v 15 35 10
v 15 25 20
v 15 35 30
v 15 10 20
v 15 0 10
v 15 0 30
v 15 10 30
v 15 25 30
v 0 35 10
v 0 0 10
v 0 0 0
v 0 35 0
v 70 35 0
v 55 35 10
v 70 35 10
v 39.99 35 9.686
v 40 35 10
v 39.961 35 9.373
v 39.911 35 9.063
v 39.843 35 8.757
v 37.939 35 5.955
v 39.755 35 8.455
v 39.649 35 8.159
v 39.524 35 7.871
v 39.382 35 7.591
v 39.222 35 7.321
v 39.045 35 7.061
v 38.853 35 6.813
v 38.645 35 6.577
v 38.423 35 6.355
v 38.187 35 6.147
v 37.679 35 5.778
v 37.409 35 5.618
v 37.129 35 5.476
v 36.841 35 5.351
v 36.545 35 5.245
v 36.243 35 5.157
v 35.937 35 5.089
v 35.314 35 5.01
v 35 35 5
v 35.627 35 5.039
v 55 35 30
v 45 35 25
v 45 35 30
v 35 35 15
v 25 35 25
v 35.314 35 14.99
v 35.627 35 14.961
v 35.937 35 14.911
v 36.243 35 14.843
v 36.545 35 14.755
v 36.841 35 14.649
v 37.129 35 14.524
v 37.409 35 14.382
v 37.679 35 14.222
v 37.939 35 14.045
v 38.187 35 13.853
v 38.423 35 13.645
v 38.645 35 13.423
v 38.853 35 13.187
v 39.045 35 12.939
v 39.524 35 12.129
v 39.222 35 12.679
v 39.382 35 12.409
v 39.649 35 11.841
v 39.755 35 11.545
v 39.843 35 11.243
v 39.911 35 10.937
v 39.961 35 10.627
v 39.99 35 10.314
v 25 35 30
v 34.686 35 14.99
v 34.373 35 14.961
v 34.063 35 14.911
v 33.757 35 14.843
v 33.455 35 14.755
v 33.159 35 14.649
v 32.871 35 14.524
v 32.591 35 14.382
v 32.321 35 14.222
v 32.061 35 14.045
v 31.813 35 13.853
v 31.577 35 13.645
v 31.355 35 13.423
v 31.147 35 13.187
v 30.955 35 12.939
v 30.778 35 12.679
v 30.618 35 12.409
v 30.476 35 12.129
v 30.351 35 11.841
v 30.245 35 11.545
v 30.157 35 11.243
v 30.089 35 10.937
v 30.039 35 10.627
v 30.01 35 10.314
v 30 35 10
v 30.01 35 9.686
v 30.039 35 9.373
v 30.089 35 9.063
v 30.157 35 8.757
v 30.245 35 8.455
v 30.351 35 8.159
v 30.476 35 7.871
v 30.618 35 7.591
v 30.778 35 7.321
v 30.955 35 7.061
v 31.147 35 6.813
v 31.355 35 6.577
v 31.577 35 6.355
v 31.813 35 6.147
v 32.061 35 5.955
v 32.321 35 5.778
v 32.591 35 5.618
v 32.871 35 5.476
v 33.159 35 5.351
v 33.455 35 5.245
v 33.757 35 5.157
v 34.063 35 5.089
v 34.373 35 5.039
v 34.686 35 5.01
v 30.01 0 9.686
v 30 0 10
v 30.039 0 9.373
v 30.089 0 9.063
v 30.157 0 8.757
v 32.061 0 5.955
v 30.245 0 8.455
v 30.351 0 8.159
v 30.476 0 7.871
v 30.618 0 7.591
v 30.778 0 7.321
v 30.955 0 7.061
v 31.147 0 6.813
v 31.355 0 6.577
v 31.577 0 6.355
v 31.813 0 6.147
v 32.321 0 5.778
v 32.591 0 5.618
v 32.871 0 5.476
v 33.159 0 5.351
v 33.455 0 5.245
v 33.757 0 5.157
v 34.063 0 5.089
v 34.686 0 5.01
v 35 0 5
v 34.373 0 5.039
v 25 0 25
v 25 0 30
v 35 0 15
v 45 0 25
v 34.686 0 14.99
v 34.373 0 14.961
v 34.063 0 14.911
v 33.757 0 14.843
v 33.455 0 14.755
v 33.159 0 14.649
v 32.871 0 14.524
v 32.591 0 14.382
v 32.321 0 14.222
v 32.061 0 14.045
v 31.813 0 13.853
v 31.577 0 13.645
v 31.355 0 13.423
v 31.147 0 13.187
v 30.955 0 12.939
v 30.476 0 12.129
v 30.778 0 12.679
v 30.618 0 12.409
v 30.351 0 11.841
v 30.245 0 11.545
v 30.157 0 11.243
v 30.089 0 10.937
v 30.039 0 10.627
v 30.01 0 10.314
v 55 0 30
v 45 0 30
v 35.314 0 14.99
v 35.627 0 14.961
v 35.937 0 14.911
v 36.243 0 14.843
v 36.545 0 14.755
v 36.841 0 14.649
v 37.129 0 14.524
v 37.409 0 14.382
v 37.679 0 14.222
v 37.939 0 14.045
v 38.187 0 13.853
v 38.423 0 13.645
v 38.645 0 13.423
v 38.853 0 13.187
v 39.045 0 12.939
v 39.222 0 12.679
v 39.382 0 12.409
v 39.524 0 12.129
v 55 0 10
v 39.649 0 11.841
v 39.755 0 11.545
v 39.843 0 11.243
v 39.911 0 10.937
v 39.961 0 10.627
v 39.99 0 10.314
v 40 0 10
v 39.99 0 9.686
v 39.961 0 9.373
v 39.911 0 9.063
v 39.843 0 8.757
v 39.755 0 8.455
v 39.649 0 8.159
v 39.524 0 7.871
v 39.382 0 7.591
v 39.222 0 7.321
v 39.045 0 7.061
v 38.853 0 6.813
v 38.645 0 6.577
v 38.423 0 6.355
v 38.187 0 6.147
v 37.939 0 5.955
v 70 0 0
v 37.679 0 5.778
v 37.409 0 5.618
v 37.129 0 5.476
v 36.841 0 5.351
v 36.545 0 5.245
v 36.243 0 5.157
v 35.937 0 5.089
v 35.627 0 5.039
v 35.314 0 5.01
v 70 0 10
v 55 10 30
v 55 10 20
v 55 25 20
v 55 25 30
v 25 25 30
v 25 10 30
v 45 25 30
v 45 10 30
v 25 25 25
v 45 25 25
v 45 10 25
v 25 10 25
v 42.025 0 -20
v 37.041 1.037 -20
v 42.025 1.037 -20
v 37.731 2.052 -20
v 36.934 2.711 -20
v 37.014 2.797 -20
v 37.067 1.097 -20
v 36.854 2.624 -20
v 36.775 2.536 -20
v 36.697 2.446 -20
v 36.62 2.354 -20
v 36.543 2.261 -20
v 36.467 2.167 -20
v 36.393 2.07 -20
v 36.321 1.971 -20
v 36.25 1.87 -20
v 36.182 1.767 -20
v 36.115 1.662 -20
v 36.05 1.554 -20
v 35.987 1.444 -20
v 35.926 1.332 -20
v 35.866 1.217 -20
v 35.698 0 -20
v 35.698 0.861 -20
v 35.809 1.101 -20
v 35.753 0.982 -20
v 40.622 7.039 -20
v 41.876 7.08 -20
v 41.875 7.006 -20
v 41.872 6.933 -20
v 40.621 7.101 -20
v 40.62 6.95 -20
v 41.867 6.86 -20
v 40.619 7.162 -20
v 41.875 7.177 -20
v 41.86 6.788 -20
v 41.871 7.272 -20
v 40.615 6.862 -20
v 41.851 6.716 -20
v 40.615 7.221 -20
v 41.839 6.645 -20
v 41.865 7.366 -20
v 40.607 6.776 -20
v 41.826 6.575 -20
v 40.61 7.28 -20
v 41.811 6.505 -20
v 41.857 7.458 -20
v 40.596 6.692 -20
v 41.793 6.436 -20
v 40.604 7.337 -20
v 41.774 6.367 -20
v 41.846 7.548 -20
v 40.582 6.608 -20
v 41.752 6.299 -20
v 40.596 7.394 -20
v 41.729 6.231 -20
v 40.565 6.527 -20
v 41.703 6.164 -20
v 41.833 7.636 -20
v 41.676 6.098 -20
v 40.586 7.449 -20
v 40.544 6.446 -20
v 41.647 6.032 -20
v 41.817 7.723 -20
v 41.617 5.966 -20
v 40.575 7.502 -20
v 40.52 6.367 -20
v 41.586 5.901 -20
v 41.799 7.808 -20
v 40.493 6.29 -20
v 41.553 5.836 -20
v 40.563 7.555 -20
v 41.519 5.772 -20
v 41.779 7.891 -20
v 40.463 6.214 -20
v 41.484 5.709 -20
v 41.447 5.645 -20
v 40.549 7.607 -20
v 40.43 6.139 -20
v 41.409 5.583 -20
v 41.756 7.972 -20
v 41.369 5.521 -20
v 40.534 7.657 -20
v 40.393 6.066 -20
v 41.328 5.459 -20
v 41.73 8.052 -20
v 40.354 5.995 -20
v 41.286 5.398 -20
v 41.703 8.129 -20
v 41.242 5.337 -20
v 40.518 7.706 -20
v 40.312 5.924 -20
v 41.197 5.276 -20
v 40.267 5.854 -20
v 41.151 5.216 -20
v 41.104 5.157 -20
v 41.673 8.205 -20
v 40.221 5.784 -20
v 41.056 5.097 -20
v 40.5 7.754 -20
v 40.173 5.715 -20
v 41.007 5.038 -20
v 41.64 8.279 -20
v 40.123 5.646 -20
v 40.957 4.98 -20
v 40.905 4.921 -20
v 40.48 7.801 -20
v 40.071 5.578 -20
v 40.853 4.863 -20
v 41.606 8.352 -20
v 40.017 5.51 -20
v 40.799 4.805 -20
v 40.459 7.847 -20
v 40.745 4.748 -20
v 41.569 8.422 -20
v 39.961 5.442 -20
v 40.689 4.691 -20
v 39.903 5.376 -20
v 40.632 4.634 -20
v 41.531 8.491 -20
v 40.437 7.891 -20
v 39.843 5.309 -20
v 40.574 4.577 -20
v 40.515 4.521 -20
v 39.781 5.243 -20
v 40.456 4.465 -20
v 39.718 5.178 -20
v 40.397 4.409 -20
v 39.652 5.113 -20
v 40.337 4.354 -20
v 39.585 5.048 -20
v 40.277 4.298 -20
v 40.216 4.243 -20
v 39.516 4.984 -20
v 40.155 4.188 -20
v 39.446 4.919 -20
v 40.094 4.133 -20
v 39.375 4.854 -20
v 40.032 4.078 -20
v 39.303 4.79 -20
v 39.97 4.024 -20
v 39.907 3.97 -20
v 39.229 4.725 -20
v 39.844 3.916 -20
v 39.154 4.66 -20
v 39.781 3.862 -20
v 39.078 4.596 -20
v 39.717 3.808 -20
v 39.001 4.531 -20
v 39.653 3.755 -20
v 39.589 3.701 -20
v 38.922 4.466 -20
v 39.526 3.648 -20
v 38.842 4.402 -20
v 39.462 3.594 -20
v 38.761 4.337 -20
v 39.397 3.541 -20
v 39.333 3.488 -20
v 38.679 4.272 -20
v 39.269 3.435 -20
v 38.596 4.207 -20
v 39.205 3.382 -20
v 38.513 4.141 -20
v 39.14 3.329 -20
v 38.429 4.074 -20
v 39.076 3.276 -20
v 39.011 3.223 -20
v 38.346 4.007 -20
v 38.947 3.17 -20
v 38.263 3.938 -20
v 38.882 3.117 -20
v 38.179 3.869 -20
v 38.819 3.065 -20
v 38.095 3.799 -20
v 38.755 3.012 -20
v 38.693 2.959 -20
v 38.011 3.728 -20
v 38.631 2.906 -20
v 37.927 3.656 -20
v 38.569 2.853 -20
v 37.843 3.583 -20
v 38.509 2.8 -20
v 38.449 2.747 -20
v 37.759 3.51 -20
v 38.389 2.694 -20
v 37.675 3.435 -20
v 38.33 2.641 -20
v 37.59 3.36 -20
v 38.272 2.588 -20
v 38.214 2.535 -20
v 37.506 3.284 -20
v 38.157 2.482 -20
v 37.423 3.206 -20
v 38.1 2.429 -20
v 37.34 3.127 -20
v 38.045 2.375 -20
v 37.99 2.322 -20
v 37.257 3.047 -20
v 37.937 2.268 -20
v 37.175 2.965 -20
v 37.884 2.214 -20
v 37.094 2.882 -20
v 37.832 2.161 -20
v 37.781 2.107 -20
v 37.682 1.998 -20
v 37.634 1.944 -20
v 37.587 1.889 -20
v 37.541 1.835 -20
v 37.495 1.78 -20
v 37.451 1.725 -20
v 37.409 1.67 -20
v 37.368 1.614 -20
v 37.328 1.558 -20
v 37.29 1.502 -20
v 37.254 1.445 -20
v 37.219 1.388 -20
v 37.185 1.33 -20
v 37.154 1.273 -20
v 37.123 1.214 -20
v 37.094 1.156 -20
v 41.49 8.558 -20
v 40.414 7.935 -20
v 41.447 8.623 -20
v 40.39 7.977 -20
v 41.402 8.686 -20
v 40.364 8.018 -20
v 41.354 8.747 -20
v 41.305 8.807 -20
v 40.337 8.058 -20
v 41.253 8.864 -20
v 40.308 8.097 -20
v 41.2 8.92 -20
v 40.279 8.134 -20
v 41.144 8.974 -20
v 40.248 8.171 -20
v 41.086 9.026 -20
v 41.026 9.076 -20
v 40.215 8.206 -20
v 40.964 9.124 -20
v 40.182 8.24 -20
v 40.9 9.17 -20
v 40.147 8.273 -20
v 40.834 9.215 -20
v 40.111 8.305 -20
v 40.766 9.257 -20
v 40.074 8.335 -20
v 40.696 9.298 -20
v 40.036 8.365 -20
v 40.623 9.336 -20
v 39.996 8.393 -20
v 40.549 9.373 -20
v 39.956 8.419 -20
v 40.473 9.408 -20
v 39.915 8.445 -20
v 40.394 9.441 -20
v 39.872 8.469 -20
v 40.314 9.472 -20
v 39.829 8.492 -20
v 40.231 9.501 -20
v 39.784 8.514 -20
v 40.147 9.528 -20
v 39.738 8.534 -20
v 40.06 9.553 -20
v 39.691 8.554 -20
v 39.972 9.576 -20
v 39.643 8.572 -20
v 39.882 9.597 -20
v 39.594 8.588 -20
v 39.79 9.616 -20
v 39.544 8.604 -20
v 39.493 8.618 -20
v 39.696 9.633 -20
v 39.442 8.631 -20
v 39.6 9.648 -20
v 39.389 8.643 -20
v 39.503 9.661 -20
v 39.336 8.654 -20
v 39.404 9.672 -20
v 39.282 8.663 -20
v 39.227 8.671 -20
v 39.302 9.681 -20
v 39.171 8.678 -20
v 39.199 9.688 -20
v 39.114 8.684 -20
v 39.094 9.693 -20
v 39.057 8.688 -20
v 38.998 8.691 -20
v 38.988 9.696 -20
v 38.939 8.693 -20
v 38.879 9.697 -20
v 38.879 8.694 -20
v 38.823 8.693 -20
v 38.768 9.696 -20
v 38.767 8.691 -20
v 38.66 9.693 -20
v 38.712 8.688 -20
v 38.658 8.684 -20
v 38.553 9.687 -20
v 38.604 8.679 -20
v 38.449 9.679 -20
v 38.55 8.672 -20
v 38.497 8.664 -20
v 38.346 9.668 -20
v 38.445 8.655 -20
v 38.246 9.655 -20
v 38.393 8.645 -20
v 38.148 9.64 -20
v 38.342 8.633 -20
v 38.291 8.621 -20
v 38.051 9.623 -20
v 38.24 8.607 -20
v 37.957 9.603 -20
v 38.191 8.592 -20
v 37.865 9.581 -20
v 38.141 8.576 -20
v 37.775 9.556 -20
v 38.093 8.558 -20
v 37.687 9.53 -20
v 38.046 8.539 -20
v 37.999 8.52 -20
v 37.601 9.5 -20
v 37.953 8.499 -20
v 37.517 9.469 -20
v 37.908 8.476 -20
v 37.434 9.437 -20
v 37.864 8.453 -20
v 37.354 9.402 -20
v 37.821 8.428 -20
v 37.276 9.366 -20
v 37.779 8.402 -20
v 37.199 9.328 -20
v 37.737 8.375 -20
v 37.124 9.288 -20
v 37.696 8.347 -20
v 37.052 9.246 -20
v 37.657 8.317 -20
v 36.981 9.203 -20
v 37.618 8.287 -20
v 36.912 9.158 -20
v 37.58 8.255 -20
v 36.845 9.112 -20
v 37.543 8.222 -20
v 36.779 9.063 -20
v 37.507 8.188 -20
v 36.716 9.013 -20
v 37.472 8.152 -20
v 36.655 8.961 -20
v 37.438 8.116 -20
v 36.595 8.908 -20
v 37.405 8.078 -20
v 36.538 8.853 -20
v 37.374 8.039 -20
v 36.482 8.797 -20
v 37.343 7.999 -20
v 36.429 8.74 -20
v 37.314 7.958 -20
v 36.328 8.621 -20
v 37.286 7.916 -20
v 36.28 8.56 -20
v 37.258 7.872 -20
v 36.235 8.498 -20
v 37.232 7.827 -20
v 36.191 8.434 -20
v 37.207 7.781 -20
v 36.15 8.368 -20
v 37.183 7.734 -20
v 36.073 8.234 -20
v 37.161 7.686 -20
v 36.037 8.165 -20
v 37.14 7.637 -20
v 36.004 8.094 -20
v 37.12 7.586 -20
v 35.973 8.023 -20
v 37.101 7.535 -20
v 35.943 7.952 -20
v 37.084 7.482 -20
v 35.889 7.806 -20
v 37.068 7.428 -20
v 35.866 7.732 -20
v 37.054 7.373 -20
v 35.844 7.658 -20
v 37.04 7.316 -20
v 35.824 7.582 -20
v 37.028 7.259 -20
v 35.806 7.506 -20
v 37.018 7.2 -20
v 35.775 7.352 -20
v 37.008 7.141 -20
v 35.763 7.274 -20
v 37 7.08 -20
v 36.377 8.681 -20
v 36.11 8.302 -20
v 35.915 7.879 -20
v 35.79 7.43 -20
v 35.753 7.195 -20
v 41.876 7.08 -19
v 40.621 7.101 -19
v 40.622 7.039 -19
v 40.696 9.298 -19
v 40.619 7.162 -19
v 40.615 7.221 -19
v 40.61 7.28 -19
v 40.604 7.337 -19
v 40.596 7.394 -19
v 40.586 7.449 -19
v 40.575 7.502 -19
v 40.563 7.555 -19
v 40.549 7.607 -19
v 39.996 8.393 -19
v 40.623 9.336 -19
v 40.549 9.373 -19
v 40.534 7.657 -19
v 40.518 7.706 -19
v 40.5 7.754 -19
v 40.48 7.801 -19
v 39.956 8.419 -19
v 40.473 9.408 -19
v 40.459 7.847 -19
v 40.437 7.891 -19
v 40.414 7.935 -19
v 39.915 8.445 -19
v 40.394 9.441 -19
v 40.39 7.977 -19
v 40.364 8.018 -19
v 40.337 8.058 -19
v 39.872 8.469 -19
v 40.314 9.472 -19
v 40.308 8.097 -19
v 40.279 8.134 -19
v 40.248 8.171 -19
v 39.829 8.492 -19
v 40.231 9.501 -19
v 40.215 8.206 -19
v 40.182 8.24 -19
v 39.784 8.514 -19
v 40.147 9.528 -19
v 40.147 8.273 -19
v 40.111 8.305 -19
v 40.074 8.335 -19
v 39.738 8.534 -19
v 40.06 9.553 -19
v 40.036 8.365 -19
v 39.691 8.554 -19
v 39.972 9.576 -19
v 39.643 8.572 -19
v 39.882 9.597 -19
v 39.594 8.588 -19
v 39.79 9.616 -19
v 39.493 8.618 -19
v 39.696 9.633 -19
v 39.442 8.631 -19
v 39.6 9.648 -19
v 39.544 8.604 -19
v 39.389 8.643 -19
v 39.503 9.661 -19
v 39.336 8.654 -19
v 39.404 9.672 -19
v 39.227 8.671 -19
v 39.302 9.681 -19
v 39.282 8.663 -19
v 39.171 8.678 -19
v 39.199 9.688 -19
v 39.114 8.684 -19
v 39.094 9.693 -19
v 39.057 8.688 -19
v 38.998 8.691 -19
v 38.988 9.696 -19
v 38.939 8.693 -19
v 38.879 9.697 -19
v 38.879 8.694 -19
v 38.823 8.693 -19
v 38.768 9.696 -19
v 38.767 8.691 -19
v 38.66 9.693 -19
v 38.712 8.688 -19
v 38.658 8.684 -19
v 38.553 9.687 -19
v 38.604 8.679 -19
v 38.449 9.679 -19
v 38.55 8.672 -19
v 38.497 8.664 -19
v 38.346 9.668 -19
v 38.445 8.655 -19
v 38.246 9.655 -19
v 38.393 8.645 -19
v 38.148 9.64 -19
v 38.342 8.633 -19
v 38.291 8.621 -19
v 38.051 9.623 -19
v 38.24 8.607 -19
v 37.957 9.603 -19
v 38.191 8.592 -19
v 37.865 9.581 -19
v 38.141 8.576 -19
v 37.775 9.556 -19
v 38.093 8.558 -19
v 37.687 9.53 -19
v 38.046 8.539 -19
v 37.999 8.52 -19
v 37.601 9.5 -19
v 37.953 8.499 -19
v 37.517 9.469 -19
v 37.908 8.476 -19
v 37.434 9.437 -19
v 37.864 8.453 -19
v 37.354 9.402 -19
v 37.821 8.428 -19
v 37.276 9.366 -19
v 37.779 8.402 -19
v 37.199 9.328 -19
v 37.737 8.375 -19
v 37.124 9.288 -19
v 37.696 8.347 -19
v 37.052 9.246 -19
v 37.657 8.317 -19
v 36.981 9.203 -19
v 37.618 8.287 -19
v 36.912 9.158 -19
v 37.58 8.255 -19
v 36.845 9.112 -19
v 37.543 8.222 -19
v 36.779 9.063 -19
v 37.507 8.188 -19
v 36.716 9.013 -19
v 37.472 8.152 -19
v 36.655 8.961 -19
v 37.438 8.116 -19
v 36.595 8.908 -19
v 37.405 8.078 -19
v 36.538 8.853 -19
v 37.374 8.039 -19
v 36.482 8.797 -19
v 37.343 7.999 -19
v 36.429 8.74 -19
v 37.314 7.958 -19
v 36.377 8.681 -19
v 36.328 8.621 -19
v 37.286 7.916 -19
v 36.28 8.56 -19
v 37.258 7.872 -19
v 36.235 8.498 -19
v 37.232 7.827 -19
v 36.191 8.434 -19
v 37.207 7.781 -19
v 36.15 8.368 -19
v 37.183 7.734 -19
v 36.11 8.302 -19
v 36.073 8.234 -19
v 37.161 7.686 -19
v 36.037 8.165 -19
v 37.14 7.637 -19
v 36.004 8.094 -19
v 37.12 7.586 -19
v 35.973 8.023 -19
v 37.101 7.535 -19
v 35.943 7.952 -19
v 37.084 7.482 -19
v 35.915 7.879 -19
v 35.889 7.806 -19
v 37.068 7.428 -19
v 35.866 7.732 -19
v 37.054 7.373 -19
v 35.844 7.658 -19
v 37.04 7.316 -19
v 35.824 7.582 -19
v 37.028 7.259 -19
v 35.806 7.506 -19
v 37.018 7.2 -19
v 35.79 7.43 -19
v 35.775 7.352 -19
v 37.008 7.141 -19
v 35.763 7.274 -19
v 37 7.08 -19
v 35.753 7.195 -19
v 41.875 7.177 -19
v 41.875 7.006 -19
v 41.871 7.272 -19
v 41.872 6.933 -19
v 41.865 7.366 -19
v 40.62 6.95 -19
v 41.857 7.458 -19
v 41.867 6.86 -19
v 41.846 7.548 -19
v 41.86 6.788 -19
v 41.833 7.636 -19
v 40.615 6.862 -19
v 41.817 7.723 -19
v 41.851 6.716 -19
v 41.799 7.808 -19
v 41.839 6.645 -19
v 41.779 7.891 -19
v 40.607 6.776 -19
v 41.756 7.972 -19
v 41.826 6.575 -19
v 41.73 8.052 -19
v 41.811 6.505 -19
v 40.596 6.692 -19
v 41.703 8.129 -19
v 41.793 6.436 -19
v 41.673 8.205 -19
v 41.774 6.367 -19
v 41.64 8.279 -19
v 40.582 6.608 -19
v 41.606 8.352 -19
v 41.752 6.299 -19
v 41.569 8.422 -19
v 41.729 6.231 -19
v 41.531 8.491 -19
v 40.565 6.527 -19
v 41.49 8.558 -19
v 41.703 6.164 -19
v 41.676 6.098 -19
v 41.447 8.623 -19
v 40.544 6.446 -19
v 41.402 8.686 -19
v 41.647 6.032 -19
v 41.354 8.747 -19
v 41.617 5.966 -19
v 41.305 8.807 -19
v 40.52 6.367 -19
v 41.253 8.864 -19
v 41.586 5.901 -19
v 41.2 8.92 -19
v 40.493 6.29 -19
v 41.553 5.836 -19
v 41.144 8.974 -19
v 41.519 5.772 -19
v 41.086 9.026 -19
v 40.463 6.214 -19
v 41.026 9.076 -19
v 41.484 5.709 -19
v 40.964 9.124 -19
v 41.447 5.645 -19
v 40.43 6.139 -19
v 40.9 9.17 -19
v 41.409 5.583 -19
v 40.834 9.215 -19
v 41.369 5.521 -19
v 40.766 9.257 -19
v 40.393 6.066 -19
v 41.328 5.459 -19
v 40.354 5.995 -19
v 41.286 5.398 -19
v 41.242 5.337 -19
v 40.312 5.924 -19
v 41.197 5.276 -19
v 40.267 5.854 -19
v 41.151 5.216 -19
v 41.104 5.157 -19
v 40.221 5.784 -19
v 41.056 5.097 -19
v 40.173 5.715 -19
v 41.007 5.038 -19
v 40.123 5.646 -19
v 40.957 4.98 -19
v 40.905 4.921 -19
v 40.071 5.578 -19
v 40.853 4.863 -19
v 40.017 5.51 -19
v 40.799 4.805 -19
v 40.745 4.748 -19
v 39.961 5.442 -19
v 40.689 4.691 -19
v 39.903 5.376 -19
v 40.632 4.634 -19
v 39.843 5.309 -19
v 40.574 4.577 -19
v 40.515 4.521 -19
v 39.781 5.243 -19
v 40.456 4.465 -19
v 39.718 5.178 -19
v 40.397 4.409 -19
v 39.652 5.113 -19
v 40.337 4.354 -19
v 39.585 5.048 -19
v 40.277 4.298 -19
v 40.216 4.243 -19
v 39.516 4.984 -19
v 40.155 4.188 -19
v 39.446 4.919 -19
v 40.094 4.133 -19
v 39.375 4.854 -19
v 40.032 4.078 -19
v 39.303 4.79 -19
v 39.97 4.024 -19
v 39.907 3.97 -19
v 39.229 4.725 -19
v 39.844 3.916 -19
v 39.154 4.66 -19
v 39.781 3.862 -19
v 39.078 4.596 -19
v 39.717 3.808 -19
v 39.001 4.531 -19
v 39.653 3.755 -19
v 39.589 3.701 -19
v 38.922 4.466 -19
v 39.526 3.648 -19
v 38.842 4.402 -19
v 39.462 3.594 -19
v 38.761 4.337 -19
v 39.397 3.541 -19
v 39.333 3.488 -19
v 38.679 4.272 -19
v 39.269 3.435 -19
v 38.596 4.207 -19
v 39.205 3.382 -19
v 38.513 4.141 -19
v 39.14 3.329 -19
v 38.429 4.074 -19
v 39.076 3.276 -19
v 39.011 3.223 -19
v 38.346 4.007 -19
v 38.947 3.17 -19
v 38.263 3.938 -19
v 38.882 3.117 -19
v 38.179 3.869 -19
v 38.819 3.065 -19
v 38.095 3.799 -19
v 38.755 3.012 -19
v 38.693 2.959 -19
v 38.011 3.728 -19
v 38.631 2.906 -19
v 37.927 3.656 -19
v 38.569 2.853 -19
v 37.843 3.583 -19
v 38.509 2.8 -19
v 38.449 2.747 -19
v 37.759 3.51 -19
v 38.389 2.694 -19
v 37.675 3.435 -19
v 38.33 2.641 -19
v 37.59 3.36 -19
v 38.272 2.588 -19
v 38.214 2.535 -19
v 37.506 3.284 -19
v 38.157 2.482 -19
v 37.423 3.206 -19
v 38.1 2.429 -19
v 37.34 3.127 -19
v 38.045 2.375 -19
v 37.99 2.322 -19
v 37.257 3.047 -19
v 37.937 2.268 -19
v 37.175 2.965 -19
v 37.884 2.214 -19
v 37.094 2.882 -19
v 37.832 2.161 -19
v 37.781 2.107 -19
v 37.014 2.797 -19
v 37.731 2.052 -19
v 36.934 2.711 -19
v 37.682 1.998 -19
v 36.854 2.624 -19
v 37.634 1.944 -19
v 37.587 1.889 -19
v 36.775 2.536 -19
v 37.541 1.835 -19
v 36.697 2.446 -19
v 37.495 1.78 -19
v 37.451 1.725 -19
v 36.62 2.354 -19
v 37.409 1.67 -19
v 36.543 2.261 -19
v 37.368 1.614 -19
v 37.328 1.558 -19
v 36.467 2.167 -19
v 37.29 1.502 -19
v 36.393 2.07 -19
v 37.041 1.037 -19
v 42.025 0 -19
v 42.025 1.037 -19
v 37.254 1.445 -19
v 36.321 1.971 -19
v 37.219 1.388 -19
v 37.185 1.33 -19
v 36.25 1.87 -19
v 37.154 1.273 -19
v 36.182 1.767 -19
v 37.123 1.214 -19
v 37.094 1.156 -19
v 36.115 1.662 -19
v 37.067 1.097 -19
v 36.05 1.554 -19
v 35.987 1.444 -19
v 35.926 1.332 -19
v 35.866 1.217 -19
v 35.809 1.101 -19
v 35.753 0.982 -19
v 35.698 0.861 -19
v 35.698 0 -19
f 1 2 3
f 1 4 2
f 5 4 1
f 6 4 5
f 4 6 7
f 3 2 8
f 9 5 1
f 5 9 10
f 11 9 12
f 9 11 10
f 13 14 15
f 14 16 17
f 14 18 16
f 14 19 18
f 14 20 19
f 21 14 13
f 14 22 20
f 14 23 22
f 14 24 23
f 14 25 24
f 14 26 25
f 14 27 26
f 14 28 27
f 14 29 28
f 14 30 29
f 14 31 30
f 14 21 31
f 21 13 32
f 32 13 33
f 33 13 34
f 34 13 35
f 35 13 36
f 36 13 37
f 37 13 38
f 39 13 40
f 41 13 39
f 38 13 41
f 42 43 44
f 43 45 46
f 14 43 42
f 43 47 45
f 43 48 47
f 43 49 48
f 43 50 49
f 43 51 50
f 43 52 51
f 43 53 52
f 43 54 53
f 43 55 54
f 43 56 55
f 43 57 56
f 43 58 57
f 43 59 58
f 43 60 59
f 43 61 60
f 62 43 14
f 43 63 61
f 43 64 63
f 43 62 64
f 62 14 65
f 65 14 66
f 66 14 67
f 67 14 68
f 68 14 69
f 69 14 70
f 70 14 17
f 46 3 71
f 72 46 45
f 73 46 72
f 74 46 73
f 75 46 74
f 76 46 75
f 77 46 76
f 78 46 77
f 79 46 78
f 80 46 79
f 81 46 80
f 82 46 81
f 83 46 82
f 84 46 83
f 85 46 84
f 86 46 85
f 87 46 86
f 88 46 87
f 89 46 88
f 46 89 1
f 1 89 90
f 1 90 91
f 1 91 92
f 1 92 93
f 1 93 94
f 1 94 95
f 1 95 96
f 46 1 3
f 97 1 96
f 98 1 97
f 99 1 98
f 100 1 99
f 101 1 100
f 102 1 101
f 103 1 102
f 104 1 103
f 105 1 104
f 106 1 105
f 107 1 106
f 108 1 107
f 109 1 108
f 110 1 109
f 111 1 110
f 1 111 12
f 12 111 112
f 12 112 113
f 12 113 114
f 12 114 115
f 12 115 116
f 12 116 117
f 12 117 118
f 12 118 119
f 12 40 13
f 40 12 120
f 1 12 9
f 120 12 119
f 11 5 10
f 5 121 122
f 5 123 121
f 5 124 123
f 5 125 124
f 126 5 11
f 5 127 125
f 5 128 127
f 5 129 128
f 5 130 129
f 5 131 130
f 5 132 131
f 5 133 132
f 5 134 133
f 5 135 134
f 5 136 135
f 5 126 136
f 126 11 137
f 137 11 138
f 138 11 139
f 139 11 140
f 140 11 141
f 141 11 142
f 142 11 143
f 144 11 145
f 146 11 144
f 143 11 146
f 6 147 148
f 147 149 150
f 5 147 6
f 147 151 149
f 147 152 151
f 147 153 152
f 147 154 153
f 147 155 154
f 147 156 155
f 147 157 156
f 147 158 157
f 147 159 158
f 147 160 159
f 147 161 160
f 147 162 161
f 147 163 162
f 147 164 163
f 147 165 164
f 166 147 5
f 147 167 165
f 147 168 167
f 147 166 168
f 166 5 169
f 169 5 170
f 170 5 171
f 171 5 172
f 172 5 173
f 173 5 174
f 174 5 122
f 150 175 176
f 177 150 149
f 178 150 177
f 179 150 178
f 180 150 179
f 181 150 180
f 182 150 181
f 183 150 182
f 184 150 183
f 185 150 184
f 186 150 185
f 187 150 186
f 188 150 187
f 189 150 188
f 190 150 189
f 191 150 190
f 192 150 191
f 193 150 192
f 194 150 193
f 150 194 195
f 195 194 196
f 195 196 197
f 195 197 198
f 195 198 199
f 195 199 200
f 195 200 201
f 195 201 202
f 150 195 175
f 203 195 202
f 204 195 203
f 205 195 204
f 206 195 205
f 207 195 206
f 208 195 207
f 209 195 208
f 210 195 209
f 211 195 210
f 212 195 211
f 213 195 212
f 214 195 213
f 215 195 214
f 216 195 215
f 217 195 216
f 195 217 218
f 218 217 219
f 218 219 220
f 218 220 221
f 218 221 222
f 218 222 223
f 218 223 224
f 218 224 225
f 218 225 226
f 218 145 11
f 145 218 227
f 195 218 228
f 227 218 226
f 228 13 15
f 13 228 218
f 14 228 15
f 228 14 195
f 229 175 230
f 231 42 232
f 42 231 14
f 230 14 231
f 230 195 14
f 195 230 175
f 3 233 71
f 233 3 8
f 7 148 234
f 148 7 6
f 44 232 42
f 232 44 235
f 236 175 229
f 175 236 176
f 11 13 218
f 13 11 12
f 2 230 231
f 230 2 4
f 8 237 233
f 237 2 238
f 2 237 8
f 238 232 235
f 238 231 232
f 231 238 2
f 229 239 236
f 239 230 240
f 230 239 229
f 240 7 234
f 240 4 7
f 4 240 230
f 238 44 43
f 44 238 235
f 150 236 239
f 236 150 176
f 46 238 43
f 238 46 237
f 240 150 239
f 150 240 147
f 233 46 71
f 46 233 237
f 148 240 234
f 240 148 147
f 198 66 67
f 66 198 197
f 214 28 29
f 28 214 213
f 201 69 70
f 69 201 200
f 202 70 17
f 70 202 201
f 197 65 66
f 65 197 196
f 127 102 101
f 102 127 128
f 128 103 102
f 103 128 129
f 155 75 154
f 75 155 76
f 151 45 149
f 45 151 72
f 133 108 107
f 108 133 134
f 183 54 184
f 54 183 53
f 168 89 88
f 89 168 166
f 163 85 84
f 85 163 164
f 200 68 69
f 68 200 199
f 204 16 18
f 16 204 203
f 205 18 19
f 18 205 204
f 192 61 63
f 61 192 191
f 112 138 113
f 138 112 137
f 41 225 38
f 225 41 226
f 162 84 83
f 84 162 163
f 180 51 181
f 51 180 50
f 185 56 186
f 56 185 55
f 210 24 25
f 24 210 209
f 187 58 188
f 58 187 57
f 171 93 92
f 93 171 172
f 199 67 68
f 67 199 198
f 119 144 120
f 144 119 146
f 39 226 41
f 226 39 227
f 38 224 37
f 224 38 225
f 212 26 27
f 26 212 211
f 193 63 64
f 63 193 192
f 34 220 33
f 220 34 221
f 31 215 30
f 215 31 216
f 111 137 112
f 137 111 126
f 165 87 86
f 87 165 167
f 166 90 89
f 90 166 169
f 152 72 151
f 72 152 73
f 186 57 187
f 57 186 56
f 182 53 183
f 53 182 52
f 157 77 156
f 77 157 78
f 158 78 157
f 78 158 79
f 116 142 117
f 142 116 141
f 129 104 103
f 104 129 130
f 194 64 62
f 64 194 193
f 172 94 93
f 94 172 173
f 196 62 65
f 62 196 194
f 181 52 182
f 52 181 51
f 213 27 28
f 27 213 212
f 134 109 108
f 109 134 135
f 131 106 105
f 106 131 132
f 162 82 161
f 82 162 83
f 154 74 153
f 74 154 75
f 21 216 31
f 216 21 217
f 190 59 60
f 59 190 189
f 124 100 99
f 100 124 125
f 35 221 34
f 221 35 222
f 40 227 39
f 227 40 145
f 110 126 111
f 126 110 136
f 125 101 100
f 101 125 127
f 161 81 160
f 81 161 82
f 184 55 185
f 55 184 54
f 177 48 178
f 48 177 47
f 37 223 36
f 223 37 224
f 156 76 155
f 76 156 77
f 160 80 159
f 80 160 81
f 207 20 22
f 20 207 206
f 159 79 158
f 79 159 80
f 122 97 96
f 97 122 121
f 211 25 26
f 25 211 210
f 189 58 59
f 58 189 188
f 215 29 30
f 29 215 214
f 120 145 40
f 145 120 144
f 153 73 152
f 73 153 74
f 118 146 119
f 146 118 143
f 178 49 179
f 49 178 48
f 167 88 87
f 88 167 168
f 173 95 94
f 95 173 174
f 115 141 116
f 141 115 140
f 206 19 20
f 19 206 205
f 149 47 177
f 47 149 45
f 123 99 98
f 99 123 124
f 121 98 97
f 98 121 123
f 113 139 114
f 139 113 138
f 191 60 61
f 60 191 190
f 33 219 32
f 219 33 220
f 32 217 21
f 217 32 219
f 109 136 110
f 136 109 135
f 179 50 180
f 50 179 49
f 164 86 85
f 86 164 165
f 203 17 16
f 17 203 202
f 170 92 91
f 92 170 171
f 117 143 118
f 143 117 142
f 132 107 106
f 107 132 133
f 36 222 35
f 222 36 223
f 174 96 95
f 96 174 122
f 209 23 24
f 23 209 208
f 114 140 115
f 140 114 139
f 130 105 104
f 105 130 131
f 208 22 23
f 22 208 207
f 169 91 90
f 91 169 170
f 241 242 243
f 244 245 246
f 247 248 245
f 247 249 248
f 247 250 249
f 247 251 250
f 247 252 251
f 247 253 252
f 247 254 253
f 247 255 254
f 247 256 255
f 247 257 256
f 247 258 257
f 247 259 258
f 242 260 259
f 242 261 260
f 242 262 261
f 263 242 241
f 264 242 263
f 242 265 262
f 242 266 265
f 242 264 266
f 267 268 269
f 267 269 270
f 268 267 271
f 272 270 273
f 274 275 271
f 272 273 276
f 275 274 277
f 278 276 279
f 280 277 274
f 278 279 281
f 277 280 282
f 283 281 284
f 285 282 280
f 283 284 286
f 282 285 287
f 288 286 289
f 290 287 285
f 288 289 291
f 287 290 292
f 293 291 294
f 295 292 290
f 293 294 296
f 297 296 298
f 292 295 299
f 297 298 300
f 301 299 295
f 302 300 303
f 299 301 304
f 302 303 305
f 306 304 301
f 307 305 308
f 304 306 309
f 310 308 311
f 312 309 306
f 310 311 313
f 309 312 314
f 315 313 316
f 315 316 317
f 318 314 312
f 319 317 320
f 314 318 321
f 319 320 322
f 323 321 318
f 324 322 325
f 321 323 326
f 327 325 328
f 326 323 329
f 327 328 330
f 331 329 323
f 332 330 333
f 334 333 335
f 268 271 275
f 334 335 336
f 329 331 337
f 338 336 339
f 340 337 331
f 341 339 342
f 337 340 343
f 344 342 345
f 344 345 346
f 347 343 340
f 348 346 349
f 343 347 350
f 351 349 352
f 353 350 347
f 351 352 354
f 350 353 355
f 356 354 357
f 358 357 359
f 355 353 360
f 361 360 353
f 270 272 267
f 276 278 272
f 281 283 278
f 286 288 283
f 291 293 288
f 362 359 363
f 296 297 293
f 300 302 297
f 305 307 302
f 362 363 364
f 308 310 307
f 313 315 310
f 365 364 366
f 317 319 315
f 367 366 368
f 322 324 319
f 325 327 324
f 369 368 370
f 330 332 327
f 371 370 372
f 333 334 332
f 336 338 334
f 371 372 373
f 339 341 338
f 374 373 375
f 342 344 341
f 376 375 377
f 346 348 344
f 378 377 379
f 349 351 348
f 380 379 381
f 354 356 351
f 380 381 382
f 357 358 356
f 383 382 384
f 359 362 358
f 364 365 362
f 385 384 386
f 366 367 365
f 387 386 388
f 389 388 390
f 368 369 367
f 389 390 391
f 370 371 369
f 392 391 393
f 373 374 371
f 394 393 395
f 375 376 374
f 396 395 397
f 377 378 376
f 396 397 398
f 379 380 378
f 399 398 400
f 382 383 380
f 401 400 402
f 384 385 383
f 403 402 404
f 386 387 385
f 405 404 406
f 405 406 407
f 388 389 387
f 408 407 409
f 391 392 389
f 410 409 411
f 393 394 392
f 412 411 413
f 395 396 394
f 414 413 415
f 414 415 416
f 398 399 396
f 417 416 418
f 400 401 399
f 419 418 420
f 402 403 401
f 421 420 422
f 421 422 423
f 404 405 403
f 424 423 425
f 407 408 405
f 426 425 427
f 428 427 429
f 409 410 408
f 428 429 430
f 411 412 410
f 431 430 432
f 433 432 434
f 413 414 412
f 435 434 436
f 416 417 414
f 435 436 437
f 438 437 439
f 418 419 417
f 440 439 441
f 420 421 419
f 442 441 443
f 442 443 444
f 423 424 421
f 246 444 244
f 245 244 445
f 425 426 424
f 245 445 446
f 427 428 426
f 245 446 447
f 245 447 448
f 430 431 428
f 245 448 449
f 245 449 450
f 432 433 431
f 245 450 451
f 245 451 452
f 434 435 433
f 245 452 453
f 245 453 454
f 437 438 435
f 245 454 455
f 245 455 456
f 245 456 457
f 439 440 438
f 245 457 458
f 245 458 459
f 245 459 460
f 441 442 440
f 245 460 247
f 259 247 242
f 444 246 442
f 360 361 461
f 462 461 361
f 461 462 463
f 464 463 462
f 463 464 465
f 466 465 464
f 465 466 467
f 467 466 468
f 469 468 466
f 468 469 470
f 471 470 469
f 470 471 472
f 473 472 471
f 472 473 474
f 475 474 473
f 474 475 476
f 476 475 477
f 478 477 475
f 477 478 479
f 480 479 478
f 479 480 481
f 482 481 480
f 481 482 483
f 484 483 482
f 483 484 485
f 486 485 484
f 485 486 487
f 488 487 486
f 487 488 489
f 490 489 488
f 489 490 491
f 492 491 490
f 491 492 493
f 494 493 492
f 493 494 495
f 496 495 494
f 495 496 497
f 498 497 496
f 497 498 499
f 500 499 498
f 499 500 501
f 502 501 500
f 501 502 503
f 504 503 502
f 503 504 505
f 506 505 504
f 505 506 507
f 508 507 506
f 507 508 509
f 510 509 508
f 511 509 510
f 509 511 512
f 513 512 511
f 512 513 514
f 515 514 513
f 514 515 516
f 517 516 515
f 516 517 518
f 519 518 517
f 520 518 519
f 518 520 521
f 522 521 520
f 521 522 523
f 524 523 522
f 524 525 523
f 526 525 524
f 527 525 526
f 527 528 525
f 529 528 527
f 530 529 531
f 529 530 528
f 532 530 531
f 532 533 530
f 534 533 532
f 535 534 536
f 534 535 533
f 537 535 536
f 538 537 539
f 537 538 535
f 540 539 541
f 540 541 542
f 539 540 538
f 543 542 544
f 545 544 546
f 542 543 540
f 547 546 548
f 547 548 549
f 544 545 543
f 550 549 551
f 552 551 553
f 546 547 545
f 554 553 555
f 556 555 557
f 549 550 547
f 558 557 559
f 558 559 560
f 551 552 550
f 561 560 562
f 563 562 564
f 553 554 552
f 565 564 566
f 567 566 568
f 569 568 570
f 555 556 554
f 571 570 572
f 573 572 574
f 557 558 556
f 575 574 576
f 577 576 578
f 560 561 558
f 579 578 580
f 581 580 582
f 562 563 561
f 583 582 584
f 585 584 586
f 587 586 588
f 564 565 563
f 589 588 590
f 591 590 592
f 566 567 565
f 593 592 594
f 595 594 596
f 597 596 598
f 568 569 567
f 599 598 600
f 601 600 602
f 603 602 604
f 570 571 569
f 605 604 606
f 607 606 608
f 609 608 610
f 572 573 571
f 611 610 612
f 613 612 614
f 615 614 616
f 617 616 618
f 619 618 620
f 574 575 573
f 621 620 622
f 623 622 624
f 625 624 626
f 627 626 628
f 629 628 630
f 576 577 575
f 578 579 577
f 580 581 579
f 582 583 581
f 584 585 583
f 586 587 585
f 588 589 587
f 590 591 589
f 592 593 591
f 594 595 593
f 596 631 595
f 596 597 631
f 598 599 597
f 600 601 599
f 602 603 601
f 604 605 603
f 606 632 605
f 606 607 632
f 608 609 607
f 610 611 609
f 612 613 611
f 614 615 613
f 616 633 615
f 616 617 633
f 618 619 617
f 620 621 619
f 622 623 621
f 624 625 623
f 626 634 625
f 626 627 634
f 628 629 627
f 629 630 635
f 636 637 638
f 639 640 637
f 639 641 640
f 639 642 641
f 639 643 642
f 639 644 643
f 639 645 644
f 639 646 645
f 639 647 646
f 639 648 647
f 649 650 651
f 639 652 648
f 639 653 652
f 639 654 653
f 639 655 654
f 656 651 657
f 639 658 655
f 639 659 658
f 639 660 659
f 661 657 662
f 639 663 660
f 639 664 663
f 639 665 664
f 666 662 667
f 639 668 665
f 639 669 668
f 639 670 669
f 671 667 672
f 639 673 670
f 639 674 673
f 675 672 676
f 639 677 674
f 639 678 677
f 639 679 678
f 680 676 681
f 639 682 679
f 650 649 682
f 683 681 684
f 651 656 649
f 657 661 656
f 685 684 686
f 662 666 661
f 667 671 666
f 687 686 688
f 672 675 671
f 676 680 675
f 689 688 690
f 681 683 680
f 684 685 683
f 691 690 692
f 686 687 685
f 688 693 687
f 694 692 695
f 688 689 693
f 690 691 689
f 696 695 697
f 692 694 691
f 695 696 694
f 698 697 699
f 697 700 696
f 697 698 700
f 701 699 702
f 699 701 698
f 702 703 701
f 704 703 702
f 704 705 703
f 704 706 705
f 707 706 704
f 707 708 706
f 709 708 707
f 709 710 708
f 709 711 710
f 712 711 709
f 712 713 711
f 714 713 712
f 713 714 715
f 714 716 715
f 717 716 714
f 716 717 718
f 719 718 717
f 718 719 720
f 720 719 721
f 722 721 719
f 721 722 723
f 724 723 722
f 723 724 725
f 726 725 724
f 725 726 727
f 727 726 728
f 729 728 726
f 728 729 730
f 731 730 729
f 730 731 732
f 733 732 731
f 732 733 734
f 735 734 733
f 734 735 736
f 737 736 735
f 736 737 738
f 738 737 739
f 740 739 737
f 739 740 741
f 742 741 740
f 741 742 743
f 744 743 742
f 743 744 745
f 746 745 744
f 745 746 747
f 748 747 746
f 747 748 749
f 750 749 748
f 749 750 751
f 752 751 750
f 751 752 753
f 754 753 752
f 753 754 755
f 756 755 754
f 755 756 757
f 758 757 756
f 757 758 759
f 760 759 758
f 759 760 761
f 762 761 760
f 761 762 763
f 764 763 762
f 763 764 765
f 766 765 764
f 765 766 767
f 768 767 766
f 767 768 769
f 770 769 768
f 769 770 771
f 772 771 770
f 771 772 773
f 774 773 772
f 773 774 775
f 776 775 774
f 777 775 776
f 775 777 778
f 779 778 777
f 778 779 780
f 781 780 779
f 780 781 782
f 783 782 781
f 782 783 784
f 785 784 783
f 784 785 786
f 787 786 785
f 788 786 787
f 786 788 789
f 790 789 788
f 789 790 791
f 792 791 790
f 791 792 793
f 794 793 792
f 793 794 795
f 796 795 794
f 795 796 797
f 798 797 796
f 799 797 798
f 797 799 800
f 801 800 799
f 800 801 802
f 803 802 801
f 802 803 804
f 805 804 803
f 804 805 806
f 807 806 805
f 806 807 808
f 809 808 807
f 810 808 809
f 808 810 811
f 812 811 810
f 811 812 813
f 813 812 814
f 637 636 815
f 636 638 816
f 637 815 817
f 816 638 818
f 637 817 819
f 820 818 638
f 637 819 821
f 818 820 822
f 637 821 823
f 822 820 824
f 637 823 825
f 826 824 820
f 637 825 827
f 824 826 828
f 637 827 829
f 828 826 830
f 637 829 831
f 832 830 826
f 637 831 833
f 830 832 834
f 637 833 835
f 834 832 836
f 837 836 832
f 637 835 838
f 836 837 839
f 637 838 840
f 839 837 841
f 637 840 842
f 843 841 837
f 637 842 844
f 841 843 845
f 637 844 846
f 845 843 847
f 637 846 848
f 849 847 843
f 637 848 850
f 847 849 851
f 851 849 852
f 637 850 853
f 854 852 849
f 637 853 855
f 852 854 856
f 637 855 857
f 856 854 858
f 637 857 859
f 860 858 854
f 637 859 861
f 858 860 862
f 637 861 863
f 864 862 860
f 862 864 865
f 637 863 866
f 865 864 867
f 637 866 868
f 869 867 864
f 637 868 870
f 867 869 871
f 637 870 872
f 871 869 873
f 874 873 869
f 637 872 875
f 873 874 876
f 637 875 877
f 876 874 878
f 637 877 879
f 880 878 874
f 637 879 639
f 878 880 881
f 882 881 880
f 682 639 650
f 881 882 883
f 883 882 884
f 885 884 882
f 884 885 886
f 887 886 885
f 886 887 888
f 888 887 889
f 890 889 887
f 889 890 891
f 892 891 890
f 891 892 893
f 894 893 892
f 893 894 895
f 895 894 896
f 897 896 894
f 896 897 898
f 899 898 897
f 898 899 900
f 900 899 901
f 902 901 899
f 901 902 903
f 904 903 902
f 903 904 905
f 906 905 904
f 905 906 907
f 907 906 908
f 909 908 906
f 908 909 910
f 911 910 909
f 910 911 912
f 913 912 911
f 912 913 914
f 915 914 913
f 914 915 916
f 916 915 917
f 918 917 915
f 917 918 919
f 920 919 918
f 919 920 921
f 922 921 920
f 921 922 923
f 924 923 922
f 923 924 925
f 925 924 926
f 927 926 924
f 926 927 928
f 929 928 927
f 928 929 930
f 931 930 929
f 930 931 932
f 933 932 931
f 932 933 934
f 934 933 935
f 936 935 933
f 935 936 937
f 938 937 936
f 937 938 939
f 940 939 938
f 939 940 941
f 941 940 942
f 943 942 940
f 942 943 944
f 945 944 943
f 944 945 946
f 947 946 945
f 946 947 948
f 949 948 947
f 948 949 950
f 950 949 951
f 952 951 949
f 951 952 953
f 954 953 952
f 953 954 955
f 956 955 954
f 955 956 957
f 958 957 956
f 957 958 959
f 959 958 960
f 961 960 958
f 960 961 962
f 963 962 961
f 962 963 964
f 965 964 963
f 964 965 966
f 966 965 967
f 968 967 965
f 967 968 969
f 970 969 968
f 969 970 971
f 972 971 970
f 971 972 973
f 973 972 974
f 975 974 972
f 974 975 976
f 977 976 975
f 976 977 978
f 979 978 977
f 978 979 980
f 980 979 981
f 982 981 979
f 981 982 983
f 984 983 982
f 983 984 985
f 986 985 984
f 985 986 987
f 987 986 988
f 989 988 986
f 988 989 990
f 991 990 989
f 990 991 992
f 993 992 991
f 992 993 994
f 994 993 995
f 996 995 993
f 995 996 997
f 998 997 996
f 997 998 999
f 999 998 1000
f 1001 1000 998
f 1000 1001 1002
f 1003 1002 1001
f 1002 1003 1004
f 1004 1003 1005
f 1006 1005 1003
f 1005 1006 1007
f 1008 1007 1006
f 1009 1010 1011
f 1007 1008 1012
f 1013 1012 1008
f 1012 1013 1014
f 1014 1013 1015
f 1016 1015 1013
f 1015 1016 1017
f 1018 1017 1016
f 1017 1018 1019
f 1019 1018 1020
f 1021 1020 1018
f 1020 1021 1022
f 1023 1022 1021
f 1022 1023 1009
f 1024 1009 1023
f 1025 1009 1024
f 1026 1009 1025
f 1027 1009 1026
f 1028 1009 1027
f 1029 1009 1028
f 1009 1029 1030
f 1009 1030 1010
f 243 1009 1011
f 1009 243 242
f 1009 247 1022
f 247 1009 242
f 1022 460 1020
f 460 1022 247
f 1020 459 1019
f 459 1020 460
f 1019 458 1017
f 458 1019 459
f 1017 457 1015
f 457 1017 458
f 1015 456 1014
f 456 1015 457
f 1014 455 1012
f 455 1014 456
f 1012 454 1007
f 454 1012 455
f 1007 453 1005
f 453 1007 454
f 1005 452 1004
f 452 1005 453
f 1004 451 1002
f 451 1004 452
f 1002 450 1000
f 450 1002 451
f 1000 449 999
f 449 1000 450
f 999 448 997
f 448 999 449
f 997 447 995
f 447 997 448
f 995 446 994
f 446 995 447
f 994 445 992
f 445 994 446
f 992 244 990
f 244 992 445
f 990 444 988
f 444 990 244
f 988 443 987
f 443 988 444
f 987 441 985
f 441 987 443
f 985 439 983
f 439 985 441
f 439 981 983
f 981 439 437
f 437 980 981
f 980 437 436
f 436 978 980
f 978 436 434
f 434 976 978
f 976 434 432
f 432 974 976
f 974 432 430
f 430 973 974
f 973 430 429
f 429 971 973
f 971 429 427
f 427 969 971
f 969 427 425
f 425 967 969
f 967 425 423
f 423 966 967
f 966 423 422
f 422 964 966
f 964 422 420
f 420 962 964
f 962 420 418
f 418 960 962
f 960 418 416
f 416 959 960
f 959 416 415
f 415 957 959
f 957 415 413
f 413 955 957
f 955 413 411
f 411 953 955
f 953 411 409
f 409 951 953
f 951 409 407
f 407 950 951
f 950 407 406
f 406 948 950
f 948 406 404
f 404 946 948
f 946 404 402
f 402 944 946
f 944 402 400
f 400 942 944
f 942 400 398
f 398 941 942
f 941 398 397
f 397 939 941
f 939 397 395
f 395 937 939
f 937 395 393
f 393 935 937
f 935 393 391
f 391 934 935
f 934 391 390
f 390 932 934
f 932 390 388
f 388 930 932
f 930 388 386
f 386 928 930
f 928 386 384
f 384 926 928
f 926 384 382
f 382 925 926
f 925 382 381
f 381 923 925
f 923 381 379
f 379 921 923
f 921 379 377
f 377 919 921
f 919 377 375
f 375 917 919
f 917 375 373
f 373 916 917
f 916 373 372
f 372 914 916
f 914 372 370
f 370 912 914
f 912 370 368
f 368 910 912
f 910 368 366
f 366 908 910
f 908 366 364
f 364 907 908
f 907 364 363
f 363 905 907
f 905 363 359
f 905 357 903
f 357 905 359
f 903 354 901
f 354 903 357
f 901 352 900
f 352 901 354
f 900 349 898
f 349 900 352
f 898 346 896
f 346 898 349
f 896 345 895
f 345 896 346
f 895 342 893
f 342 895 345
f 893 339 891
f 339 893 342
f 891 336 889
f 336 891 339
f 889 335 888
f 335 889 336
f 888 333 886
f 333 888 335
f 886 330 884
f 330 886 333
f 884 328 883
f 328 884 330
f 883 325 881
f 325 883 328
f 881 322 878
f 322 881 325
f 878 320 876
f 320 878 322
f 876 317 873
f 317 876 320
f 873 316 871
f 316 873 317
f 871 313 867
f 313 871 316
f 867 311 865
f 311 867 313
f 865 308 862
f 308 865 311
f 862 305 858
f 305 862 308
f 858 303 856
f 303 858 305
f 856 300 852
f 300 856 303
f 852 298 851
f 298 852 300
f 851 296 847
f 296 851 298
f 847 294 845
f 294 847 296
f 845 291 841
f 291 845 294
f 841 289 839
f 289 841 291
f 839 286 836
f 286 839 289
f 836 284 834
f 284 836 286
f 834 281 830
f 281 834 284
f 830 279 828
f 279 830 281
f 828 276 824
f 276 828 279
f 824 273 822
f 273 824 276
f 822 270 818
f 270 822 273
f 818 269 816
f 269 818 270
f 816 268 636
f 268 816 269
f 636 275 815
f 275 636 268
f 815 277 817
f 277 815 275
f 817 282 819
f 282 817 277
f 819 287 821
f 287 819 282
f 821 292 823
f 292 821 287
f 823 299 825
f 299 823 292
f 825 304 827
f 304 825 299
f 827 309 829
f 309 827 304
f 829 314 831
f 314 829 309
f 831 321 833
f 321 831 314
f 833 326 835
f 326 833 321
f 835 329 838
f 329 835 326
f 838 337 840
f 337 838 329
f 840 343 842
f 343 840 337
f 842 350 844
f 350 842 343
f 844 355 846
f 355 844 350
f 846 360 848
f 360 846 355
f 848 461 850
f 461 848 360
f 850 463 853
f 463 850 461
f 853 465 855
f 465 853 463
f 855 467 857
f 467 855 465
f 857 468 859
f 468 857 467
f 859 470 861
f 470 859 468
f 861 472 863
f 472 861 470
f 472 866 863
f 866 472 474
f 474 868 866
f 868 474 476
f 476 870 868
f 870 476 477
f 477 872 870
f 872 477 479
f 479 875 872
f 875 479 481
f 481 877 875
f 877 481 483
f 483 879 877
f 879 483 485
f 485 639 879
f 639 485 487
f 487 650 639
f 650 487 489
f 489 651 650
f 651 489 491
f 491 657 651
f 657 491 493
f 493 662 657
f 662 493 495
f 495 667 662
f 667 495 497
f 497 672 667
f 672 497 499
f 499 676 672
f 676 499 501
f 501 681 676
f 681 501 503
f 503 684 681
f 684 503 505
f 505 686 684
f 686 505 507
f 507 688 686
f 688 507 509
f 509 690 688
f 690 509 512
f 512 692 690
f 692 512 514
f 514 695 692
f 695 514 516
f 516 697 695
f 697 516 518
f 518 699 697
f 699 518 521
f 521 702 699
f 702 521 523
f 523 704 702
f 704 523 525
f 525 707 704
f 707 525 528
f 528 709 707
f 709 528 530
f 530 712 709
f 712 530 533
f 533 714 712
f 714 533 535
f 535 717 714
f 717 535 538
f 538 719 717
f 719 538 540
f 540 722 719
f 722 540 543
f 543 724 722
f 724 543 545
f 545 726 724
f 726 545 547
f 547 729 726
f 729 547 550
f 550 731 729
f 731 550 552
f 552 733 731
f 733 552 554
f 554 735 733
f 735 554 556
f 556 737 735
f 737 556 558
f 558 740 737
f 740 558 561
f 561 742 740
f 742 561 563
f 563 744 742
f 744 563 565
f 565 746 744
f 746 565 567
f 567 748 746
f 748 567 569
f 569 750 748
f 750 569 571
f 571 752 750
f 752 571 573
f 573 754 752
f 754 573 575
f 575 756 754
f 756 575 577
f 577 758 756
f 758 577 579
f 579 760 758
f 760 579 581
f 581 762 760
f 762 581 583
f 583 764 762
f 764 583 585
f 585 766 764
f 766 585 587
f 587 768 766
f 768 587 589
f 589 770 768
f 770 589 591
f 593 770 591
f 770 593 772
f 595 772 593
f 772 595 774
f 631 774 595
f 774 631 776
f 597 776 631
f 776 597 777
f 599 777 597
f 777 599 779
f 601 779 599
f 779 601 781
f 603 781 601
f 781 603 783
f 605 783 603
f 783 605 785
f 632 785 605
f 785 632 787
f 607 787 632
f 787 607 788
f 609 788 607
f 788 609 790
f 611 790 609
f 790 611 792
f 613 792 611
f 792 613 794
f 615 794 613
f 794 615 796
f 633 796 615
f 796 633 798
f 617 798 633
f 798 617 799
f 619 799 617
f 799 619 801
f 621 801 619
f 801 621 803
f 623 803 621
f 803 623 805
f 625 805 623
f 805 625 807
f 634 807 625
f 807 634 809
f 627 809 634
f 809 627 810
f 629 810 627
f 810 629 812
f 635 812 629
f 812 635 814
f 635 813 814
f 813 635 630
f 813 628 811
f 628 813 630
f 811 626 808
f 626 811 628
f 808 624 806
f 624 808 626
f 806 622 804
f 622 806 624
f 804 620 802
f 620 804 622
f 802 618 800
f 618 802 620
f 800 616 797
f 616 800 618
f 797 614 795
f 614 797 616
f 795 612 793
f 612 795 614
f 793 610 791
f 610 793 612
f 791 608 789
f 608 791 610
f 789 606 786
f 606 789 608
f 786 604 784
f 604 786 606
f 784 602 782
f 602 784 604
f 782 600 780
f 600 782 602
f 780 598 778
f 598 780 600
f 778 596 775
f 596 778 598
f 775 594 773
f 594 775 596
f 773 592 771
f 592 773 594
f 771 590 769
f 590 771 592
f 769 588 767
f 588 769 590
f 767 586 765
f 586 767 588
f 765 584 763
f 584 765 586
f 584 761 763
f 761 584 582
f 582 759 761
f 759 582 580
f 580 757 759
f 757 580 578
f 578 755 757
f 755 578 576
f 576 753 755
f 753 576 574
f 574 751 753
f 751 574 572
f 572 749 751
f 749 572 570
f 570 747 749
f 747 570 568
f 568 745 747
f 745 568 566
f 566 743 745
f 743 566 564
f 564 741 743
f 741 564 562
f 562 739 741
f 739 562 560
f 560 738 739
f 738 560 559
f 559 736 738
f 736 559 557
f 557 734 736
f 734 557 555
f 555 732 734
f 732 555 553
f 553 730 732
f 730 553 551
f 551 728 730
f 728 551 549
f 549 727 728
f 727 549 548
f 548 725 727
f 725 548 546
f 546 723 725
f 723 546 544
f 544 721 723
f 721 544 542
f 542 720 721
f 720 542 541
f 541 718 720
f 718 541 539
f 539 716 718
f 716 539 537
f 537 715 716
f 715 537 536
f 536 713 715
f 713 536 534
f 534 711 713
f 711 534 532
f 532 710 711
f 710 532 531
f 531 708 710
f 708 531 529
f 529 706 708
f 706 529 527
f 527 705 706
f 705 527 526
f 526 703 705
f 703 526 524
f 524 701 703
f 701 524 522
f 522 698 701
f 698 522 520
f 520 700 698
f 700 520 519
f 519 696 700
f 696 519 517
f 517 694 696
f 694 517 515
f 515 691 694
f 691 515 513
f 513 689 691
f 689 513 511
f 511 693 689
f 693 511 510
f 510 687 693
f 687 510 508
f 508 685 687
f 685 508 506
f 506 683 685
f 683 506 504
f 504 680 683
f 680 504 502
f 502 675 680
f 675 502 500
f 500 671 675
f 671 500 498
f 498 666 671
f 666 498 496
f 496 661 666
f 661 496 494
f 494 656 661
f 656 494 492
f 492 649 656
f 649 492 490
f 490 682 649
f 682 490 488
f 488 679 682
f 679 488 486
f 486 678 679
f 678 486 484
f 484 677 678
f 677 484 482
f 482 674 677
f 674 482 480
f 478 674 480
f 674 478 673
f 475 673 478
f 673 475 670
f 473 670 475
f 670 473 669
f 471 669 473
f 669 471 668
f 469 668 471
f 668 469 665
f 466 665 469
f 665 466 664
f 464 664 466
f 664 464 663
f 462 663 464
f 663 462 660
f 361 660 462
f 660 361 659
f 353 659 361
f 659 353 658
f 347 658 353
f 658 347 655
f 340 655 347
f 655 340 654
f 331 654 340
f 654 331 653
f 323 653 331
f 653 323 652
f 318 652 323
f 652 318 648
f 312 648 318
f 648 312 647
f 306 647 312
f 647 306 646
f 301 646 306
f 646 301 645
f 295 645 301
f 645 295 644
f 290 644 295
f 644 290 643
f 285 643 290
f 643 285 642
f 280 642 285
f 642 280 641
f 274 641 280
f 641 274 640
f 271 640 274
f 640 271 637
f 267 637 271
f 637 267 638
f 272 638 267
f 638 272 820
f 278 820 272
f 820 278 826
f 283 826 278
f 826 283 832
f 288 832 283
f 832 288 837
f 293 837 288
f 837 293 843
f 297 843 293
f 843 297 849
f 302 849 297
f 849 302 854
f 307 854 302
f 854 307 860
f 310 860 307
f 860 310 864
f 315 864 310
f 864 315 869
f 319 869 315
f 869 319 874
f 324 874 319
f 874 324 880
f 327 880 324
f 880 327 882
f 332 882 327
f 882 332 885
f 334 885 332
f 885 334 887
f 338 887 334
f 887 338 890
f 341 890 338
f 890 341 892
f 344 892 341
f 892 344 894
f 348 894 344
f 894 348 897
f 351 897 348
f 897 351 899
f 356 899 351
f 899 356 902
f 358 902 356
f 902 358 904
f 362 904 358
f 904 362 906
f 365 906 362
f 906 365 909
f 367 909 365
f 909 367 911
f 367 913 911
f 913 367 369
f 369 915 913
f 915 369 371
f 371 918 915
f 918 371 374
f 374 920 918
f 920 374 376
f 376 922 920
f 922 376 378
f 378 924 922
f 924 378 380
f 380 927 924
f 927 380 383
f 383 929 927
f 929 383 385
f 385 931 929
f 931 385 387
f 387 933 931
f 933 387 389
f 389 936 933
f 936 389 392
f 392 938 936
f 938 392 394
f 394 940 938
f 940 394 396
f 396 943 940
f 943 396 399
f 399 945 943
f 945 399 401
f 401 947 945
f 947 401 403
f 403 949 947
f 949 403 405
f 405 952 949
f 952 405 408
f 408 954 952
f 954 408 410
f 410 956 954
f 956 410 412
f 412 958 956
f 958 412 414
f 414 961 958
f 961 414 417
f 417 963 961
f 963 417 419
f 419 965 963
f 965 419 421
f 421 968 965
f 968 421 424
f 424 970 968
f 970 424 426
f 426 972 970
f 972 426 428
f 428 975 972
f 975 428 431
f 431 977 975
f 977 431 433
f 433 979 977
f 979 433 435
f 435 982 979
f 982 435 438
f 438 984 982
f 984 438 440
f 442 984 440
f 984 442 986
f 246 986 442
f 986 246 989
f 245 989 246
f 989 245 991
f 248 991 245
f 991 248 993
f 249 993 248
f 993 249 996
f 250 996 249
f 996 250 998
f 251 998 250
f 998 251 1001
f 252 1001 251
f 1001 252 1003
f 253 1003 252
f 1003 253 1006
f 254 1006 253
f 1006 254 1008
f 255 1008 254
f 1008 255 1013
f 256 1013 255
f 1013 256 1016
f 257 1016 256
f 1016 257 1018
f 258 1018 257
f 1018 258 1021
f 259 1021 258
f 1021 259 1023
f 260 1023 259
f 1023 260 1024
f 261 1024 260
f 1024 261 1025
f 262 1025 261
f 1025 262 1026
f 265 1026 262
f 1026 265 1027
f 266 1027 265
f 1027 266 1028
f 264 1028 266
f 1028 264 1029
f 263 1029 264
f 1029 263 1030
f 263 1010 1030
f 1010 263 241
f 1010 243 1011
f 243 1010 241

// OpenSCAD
$fn=100;
cw=70;
cd=35;
ch=30;

difference() {
    cube([cw,cd,ch]);
    translate([15,10,ch-10])
    cube([cw-15,15,10]);
    translate([25,0,25])
    cube([cw-50,cd,5]);
    for(i=[0:cw-15:cw-15]) {
        translate([i,0,10])
        cube([15,35,30]);
    }
    translate([cw/2,cd,10])
    rotate([90,0,0])
    cylinder(h=cd,d=10);
}
translate([cw/2,0,-20])
linear_extrude(height=1)
text("2");
